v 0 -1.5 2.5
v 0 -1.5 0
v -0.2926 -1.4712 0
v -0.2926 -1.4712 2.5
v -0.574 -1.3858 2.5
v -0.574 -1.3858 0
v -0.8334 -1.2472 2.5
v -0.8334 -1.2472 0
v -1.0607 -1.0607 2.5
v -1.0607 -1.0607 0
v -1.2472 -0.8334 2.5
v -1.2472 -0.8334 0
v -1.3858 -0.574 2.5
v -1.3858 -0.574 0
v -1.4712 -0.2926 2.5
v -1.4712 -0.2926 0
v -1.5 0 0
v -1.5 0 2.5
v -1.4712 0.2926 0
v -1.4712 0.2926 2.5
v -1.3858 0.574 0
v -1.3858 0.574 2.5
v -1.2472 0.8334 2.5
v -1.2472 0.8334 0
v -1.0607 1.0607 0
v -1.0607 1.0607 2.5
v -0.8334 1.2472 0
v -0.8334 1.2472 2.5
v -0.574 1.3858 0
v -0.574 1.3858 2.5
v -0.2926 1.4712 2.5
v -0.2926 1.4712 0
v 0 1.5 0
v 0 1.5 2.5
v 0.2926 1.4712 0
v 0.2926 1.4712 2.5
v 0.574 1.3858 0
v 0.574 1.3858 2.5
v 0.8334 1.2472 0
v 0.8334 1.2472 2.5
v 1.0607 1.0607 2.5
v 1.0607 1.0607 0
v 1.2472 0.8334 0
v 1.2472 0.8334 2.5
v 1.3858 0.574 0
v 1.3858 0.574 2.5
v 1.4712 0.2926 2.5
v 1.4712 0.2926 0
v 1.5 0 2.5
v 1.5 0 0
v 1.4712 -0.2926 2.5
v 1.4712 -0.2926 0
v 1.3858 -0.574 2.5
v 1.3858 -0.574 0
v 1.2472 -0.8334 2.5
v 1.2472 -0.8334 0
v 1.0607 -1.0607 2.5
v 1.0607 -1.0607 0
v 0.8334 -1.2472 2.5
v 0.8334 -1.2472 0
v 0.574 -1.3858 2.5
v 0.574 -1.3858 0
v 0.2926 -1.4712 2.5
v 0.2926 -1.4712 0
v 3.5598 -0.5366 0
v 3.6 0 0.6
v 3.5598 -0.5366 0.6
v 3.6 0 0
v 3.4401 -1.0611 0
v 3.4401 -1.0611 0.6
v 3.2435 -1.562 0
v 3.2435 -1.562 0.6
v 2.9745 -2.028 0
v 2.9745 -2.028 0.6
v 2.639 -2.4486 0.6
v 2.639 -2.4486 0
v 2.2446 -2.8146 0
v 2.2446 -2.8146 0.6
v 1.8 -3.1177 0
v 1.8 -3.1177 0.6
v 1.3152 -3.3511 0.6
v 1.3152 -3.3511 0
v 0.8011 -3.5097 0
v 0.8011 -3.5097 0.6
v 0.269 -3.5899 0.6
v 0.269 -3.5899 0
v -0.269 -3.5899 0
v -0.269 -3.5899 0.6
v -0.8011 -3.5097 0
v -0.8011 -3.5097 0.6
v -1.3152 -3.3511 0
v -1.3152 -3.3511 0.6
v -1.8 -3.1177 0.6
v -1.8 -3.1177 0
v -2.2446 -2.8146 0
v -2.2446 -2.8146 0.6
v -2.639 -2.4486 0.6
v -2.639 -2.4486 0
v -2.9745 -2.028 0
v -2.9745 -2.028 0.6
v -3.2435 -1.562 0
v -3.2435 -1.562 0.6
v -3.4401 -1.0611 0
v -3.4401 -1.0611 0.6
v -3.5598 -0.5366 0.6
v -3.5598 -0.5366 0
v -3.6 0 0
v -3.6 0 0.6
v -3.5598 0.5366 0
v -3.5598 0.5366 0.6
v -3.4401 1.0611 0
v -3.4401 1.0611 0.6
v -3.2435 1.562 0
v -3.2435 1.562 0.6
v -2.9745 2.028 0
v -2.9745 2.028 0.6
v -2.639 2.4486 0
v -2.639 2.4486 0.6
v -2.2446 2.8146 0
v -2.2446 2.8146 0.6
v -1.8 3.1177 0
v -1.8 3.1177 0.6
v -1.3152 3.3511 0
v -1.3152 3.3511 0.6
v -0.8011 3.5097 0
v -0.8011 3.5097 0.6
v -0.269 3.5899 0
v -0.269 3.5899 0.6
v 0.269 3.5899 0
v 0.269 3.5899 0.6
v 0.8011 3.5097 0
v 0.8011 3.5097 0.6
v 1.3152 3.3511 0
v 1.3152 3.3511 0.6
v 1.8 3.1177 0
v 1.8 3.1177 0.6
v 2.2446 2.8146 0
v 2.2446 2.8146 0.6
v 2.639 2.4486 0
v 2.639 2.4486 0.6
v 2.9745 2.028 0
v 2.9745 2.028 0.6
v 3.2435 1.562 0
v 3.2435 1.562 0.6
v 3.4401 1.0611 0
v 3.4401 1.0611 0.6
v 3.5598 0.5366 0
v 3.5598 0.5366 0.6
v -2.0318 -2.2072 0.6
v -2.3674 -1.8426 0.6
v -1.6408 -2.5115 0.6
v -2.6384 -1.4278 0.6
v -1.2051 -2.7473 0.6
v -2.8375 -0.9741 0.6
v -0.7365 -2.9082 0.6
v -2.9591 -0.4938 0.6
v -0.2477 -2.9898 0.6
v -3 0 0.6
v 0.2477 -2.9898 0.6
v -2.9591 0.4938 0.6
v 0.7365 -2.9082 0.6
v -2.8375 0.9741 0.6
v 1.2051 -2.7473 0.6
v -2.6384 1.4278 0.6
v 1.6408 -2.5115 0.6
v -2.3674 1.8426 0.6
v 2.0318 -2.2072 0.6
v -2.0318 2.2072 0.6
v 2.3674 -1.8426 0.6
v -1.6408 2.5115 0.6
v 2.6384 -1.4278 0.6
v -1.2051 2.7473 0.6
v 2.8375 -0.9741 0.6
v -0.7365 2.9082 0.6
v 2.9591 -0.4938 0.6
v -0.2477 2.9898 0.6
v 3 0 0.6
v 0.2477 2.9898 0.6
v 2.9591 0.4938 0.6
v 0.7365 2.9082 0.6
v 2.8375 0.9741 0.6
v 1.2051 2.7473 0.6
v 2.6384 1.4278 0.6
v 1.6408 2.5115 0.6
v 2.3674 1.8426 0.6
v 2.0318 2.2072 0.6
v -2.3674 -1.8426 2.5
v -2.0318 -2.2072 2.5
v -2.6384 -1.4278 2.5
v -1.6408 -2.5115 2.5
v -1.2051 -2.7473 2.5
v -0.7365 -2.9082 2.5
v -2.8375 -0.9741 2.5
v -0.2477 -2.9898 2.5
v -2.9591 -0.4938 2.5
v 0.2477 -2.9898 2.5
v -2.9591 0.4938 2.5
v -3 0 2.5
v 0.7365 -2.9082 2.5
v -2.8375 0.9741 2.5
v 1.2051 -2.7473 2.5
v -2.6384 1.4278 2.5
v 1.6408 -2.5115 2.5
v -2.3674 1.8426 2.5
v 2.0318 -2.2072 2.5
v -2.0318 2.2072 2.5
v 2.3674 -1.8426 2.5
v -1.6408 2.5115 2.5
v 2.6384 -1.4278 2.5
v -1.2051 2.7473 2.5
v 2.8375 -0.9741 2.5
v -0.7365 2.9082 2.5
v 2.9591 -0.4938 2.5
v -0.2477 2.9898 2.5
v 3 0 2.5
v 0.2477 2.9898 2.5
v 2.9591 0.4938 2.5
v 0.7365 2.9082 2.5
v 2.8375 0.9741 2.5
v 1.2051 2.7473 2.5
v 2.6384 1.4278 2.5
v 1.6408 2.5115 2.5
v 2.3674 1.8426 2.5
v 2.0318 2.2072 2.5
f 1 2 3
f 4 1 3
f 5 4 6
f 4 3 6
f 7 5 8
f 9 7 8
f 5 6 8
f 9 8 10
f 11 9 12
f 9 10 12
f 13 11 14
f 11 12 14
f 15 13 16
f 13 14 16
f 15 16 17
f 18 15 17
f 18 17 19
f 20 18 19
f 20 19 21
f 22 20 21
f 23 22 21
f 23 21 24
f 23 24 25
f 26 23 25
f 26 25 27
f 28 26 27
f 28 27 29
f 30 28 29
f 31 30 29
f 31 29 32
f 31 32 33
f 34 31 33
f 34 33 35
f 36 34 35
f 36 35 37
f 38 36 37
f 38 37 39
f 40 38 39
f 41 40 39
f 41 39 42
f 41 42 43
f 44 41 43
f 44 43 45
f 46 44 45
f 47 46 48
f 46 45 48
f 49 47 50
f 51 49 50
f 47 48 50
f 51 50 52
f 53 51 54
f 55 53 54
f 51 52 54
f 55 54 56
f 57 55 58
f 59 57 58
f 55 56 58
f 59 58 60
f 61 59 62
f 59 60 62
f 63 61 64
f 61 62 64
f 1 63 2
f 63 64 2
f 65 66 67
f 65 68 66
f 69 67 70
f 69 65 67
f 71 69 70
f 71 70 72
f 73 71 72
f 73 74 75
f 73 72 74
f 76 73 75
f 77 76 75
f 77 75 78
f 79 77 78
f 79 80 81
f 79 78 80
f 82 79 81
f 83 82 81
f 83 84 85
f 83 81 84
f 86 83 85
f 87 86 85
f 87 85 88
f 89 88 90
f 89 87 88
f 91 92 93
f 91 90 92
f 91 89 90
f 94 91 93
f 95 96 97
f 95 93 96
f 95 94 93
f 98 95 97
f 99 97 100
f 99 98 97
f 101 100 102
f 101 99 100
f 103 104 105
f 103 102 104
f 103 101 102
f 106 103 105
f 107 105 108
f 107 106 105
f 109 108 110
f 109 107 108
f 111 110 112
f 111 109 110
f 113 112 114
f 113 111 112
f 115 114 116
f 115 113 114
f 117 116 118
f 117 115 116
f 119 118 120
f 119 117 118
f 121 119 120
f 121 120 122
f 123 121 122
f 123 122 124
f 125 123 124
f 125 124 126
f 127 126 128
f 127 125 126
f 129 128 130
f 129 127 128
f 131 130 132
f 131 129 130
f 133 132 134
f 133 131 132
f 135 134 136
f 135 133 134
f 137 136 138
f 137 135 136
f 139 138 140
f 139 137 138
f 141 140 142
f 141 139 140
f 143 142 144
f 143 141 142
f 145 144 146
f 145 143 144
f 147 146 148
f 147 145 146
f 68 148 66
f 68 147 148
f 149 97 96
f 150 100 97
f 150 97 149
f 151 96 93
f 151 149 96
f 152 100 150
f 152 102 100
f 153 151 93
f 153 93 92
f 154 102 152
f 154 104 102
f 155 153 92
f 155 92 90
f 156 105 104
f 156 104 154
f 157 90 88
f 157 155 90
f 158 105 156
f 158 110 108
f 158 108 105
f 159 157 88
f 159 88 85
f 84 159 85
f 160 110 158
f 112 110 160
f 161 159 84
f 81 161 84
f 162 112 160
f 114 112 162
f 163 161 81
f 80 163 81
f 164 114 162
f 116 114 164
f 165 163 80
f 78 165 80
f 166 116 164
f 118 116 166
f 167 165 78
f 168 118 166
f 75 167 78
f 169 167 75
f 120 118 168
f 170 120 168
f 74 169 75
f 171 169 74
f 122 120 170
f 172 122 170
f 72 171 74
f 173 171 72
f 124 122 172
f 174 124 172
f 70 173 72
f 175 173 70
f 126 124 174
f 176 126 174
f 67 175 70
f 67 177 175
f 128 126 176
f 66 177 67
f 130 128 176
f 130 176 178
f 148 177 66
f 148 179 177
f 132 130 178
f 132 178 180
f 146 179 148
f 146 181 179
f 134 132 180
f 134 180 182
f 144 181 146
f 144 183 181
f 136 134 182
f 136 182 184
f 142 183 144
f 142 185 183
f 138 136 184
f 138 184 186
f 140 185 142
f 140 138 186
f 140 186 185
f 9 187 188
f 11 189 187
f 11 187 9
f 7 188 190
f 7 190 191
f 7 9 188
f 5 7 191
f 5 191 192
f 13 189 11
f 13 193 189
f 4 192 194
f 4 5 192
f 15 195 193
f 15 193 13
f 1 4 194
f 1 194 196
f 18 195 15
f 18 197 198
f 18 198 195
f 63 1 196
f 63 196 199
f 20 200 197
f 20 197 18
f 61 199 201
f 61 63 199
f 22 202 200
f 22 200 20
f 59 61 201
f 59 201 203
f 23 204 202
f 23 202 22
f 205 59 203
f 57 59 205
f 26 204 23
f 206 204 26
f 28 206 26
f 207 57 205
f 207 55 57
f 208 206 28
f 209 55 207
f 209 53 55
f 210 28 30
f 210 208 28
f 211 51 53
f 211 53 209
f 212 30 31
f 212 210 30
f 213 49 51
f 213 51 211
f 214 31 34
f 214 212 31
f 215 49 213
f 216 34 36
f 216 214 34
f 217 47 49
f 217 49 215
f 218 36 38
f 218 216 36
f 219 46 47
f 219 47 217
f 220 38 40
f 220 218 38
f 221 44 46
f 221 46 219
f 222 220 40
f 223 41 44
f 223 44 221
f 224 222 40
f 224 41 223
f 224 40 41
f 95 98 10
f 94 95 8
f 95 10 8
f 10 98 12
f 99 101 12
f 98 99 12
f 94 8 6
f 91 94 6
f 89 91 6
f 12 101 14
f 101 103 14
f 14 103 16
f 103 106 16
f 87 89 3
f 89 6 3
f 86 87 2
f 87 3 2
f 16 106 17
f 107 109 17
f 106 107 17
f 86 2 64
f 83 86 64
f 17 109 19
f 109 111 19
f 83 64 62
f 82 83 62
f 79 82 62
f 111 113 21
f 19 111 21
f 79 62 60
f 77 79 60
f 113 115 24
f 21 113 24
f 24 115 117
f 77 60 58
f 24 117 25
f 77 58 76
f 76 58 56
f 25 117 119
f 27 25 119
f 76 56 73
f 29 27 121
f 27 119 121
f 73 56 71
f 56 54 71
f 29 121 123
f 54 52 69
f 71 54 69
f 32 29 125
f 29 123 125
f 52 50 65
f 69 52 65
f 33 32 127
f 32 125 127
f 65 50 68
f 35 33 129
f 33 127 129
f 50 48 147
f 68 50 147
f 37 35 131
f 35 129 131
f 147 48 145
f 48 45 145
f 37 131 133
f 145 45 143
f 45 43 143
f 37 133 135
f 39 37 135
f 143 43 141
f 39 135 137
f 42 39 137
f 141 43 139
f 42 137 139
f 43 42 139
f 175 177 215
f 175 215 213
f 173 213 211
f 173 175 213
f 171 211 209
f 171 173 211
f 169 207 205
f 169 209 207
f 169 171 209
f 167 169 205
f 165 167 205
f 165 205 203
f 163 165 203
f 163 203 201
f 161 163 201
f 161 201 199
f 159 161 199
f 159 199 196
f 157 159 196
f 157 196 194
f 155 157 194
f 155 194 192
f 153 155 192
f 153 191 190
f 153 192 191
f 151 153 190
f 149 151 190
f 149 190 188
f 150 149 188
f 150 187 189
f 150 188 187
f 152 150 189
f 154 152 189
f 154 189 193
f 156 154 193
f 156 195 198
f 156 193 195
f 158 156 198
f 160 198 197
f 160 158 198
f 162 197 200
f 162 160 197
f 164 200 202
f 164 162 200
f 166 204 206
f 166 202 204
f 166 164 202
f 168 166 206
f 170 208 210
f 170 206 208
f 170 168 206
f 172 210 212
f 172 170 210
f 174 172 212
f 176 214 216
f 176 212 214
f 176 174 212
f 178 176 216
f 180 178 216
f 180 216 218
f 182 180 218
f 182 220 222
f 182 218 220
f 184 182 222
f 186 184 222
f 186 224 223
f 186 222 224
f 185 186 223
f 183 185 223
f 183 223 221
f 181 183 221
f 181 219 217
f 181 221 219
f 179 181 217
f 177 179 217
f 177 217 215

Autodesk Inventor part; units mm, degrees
ref_plane "YZ Plane" through (0, 0, 0) normal (1, 0, 0) x (0, 1, 0)
ref_plane "XZ Plane" through (0, 0, 0) normal (0, 1, 0) x (-1, 0, 0)
ref_plane "XY Plane" through (0, 0, 0) normal (0, 0, 1) x (1, 0, 0)
sketch "スケッチ1" plane through (0, 0, 0) normal (0, 0, 1) x (1, 0, 0)
  circle A0 centre (0, 0) radius 3.6
  dimension "d0" = 7.2
extrude "押し出し1" add sketch "スケッチ1" along normal blind 0.6
sketch "スケッチ2" plane through (0, 0, 0.6) normal (0, 0, 1) x (1, 0, 0)
  circle A0 centre (0, 0) radius 3
  dimension "d3" = 6
extrude "押し出し2" add sketch "スケッチ2" along normal blind 1.9
sketch "スケッチ3" plane through (0, 0, 2.5) normal (0, 0, 1) x (1, 0, 0)
  point P0 (0, 0)
hole "穴1" at (0, 0, 2.5) direction (0, 0, -1) diameter 3 depth 15
properties part number "ベアリング"
